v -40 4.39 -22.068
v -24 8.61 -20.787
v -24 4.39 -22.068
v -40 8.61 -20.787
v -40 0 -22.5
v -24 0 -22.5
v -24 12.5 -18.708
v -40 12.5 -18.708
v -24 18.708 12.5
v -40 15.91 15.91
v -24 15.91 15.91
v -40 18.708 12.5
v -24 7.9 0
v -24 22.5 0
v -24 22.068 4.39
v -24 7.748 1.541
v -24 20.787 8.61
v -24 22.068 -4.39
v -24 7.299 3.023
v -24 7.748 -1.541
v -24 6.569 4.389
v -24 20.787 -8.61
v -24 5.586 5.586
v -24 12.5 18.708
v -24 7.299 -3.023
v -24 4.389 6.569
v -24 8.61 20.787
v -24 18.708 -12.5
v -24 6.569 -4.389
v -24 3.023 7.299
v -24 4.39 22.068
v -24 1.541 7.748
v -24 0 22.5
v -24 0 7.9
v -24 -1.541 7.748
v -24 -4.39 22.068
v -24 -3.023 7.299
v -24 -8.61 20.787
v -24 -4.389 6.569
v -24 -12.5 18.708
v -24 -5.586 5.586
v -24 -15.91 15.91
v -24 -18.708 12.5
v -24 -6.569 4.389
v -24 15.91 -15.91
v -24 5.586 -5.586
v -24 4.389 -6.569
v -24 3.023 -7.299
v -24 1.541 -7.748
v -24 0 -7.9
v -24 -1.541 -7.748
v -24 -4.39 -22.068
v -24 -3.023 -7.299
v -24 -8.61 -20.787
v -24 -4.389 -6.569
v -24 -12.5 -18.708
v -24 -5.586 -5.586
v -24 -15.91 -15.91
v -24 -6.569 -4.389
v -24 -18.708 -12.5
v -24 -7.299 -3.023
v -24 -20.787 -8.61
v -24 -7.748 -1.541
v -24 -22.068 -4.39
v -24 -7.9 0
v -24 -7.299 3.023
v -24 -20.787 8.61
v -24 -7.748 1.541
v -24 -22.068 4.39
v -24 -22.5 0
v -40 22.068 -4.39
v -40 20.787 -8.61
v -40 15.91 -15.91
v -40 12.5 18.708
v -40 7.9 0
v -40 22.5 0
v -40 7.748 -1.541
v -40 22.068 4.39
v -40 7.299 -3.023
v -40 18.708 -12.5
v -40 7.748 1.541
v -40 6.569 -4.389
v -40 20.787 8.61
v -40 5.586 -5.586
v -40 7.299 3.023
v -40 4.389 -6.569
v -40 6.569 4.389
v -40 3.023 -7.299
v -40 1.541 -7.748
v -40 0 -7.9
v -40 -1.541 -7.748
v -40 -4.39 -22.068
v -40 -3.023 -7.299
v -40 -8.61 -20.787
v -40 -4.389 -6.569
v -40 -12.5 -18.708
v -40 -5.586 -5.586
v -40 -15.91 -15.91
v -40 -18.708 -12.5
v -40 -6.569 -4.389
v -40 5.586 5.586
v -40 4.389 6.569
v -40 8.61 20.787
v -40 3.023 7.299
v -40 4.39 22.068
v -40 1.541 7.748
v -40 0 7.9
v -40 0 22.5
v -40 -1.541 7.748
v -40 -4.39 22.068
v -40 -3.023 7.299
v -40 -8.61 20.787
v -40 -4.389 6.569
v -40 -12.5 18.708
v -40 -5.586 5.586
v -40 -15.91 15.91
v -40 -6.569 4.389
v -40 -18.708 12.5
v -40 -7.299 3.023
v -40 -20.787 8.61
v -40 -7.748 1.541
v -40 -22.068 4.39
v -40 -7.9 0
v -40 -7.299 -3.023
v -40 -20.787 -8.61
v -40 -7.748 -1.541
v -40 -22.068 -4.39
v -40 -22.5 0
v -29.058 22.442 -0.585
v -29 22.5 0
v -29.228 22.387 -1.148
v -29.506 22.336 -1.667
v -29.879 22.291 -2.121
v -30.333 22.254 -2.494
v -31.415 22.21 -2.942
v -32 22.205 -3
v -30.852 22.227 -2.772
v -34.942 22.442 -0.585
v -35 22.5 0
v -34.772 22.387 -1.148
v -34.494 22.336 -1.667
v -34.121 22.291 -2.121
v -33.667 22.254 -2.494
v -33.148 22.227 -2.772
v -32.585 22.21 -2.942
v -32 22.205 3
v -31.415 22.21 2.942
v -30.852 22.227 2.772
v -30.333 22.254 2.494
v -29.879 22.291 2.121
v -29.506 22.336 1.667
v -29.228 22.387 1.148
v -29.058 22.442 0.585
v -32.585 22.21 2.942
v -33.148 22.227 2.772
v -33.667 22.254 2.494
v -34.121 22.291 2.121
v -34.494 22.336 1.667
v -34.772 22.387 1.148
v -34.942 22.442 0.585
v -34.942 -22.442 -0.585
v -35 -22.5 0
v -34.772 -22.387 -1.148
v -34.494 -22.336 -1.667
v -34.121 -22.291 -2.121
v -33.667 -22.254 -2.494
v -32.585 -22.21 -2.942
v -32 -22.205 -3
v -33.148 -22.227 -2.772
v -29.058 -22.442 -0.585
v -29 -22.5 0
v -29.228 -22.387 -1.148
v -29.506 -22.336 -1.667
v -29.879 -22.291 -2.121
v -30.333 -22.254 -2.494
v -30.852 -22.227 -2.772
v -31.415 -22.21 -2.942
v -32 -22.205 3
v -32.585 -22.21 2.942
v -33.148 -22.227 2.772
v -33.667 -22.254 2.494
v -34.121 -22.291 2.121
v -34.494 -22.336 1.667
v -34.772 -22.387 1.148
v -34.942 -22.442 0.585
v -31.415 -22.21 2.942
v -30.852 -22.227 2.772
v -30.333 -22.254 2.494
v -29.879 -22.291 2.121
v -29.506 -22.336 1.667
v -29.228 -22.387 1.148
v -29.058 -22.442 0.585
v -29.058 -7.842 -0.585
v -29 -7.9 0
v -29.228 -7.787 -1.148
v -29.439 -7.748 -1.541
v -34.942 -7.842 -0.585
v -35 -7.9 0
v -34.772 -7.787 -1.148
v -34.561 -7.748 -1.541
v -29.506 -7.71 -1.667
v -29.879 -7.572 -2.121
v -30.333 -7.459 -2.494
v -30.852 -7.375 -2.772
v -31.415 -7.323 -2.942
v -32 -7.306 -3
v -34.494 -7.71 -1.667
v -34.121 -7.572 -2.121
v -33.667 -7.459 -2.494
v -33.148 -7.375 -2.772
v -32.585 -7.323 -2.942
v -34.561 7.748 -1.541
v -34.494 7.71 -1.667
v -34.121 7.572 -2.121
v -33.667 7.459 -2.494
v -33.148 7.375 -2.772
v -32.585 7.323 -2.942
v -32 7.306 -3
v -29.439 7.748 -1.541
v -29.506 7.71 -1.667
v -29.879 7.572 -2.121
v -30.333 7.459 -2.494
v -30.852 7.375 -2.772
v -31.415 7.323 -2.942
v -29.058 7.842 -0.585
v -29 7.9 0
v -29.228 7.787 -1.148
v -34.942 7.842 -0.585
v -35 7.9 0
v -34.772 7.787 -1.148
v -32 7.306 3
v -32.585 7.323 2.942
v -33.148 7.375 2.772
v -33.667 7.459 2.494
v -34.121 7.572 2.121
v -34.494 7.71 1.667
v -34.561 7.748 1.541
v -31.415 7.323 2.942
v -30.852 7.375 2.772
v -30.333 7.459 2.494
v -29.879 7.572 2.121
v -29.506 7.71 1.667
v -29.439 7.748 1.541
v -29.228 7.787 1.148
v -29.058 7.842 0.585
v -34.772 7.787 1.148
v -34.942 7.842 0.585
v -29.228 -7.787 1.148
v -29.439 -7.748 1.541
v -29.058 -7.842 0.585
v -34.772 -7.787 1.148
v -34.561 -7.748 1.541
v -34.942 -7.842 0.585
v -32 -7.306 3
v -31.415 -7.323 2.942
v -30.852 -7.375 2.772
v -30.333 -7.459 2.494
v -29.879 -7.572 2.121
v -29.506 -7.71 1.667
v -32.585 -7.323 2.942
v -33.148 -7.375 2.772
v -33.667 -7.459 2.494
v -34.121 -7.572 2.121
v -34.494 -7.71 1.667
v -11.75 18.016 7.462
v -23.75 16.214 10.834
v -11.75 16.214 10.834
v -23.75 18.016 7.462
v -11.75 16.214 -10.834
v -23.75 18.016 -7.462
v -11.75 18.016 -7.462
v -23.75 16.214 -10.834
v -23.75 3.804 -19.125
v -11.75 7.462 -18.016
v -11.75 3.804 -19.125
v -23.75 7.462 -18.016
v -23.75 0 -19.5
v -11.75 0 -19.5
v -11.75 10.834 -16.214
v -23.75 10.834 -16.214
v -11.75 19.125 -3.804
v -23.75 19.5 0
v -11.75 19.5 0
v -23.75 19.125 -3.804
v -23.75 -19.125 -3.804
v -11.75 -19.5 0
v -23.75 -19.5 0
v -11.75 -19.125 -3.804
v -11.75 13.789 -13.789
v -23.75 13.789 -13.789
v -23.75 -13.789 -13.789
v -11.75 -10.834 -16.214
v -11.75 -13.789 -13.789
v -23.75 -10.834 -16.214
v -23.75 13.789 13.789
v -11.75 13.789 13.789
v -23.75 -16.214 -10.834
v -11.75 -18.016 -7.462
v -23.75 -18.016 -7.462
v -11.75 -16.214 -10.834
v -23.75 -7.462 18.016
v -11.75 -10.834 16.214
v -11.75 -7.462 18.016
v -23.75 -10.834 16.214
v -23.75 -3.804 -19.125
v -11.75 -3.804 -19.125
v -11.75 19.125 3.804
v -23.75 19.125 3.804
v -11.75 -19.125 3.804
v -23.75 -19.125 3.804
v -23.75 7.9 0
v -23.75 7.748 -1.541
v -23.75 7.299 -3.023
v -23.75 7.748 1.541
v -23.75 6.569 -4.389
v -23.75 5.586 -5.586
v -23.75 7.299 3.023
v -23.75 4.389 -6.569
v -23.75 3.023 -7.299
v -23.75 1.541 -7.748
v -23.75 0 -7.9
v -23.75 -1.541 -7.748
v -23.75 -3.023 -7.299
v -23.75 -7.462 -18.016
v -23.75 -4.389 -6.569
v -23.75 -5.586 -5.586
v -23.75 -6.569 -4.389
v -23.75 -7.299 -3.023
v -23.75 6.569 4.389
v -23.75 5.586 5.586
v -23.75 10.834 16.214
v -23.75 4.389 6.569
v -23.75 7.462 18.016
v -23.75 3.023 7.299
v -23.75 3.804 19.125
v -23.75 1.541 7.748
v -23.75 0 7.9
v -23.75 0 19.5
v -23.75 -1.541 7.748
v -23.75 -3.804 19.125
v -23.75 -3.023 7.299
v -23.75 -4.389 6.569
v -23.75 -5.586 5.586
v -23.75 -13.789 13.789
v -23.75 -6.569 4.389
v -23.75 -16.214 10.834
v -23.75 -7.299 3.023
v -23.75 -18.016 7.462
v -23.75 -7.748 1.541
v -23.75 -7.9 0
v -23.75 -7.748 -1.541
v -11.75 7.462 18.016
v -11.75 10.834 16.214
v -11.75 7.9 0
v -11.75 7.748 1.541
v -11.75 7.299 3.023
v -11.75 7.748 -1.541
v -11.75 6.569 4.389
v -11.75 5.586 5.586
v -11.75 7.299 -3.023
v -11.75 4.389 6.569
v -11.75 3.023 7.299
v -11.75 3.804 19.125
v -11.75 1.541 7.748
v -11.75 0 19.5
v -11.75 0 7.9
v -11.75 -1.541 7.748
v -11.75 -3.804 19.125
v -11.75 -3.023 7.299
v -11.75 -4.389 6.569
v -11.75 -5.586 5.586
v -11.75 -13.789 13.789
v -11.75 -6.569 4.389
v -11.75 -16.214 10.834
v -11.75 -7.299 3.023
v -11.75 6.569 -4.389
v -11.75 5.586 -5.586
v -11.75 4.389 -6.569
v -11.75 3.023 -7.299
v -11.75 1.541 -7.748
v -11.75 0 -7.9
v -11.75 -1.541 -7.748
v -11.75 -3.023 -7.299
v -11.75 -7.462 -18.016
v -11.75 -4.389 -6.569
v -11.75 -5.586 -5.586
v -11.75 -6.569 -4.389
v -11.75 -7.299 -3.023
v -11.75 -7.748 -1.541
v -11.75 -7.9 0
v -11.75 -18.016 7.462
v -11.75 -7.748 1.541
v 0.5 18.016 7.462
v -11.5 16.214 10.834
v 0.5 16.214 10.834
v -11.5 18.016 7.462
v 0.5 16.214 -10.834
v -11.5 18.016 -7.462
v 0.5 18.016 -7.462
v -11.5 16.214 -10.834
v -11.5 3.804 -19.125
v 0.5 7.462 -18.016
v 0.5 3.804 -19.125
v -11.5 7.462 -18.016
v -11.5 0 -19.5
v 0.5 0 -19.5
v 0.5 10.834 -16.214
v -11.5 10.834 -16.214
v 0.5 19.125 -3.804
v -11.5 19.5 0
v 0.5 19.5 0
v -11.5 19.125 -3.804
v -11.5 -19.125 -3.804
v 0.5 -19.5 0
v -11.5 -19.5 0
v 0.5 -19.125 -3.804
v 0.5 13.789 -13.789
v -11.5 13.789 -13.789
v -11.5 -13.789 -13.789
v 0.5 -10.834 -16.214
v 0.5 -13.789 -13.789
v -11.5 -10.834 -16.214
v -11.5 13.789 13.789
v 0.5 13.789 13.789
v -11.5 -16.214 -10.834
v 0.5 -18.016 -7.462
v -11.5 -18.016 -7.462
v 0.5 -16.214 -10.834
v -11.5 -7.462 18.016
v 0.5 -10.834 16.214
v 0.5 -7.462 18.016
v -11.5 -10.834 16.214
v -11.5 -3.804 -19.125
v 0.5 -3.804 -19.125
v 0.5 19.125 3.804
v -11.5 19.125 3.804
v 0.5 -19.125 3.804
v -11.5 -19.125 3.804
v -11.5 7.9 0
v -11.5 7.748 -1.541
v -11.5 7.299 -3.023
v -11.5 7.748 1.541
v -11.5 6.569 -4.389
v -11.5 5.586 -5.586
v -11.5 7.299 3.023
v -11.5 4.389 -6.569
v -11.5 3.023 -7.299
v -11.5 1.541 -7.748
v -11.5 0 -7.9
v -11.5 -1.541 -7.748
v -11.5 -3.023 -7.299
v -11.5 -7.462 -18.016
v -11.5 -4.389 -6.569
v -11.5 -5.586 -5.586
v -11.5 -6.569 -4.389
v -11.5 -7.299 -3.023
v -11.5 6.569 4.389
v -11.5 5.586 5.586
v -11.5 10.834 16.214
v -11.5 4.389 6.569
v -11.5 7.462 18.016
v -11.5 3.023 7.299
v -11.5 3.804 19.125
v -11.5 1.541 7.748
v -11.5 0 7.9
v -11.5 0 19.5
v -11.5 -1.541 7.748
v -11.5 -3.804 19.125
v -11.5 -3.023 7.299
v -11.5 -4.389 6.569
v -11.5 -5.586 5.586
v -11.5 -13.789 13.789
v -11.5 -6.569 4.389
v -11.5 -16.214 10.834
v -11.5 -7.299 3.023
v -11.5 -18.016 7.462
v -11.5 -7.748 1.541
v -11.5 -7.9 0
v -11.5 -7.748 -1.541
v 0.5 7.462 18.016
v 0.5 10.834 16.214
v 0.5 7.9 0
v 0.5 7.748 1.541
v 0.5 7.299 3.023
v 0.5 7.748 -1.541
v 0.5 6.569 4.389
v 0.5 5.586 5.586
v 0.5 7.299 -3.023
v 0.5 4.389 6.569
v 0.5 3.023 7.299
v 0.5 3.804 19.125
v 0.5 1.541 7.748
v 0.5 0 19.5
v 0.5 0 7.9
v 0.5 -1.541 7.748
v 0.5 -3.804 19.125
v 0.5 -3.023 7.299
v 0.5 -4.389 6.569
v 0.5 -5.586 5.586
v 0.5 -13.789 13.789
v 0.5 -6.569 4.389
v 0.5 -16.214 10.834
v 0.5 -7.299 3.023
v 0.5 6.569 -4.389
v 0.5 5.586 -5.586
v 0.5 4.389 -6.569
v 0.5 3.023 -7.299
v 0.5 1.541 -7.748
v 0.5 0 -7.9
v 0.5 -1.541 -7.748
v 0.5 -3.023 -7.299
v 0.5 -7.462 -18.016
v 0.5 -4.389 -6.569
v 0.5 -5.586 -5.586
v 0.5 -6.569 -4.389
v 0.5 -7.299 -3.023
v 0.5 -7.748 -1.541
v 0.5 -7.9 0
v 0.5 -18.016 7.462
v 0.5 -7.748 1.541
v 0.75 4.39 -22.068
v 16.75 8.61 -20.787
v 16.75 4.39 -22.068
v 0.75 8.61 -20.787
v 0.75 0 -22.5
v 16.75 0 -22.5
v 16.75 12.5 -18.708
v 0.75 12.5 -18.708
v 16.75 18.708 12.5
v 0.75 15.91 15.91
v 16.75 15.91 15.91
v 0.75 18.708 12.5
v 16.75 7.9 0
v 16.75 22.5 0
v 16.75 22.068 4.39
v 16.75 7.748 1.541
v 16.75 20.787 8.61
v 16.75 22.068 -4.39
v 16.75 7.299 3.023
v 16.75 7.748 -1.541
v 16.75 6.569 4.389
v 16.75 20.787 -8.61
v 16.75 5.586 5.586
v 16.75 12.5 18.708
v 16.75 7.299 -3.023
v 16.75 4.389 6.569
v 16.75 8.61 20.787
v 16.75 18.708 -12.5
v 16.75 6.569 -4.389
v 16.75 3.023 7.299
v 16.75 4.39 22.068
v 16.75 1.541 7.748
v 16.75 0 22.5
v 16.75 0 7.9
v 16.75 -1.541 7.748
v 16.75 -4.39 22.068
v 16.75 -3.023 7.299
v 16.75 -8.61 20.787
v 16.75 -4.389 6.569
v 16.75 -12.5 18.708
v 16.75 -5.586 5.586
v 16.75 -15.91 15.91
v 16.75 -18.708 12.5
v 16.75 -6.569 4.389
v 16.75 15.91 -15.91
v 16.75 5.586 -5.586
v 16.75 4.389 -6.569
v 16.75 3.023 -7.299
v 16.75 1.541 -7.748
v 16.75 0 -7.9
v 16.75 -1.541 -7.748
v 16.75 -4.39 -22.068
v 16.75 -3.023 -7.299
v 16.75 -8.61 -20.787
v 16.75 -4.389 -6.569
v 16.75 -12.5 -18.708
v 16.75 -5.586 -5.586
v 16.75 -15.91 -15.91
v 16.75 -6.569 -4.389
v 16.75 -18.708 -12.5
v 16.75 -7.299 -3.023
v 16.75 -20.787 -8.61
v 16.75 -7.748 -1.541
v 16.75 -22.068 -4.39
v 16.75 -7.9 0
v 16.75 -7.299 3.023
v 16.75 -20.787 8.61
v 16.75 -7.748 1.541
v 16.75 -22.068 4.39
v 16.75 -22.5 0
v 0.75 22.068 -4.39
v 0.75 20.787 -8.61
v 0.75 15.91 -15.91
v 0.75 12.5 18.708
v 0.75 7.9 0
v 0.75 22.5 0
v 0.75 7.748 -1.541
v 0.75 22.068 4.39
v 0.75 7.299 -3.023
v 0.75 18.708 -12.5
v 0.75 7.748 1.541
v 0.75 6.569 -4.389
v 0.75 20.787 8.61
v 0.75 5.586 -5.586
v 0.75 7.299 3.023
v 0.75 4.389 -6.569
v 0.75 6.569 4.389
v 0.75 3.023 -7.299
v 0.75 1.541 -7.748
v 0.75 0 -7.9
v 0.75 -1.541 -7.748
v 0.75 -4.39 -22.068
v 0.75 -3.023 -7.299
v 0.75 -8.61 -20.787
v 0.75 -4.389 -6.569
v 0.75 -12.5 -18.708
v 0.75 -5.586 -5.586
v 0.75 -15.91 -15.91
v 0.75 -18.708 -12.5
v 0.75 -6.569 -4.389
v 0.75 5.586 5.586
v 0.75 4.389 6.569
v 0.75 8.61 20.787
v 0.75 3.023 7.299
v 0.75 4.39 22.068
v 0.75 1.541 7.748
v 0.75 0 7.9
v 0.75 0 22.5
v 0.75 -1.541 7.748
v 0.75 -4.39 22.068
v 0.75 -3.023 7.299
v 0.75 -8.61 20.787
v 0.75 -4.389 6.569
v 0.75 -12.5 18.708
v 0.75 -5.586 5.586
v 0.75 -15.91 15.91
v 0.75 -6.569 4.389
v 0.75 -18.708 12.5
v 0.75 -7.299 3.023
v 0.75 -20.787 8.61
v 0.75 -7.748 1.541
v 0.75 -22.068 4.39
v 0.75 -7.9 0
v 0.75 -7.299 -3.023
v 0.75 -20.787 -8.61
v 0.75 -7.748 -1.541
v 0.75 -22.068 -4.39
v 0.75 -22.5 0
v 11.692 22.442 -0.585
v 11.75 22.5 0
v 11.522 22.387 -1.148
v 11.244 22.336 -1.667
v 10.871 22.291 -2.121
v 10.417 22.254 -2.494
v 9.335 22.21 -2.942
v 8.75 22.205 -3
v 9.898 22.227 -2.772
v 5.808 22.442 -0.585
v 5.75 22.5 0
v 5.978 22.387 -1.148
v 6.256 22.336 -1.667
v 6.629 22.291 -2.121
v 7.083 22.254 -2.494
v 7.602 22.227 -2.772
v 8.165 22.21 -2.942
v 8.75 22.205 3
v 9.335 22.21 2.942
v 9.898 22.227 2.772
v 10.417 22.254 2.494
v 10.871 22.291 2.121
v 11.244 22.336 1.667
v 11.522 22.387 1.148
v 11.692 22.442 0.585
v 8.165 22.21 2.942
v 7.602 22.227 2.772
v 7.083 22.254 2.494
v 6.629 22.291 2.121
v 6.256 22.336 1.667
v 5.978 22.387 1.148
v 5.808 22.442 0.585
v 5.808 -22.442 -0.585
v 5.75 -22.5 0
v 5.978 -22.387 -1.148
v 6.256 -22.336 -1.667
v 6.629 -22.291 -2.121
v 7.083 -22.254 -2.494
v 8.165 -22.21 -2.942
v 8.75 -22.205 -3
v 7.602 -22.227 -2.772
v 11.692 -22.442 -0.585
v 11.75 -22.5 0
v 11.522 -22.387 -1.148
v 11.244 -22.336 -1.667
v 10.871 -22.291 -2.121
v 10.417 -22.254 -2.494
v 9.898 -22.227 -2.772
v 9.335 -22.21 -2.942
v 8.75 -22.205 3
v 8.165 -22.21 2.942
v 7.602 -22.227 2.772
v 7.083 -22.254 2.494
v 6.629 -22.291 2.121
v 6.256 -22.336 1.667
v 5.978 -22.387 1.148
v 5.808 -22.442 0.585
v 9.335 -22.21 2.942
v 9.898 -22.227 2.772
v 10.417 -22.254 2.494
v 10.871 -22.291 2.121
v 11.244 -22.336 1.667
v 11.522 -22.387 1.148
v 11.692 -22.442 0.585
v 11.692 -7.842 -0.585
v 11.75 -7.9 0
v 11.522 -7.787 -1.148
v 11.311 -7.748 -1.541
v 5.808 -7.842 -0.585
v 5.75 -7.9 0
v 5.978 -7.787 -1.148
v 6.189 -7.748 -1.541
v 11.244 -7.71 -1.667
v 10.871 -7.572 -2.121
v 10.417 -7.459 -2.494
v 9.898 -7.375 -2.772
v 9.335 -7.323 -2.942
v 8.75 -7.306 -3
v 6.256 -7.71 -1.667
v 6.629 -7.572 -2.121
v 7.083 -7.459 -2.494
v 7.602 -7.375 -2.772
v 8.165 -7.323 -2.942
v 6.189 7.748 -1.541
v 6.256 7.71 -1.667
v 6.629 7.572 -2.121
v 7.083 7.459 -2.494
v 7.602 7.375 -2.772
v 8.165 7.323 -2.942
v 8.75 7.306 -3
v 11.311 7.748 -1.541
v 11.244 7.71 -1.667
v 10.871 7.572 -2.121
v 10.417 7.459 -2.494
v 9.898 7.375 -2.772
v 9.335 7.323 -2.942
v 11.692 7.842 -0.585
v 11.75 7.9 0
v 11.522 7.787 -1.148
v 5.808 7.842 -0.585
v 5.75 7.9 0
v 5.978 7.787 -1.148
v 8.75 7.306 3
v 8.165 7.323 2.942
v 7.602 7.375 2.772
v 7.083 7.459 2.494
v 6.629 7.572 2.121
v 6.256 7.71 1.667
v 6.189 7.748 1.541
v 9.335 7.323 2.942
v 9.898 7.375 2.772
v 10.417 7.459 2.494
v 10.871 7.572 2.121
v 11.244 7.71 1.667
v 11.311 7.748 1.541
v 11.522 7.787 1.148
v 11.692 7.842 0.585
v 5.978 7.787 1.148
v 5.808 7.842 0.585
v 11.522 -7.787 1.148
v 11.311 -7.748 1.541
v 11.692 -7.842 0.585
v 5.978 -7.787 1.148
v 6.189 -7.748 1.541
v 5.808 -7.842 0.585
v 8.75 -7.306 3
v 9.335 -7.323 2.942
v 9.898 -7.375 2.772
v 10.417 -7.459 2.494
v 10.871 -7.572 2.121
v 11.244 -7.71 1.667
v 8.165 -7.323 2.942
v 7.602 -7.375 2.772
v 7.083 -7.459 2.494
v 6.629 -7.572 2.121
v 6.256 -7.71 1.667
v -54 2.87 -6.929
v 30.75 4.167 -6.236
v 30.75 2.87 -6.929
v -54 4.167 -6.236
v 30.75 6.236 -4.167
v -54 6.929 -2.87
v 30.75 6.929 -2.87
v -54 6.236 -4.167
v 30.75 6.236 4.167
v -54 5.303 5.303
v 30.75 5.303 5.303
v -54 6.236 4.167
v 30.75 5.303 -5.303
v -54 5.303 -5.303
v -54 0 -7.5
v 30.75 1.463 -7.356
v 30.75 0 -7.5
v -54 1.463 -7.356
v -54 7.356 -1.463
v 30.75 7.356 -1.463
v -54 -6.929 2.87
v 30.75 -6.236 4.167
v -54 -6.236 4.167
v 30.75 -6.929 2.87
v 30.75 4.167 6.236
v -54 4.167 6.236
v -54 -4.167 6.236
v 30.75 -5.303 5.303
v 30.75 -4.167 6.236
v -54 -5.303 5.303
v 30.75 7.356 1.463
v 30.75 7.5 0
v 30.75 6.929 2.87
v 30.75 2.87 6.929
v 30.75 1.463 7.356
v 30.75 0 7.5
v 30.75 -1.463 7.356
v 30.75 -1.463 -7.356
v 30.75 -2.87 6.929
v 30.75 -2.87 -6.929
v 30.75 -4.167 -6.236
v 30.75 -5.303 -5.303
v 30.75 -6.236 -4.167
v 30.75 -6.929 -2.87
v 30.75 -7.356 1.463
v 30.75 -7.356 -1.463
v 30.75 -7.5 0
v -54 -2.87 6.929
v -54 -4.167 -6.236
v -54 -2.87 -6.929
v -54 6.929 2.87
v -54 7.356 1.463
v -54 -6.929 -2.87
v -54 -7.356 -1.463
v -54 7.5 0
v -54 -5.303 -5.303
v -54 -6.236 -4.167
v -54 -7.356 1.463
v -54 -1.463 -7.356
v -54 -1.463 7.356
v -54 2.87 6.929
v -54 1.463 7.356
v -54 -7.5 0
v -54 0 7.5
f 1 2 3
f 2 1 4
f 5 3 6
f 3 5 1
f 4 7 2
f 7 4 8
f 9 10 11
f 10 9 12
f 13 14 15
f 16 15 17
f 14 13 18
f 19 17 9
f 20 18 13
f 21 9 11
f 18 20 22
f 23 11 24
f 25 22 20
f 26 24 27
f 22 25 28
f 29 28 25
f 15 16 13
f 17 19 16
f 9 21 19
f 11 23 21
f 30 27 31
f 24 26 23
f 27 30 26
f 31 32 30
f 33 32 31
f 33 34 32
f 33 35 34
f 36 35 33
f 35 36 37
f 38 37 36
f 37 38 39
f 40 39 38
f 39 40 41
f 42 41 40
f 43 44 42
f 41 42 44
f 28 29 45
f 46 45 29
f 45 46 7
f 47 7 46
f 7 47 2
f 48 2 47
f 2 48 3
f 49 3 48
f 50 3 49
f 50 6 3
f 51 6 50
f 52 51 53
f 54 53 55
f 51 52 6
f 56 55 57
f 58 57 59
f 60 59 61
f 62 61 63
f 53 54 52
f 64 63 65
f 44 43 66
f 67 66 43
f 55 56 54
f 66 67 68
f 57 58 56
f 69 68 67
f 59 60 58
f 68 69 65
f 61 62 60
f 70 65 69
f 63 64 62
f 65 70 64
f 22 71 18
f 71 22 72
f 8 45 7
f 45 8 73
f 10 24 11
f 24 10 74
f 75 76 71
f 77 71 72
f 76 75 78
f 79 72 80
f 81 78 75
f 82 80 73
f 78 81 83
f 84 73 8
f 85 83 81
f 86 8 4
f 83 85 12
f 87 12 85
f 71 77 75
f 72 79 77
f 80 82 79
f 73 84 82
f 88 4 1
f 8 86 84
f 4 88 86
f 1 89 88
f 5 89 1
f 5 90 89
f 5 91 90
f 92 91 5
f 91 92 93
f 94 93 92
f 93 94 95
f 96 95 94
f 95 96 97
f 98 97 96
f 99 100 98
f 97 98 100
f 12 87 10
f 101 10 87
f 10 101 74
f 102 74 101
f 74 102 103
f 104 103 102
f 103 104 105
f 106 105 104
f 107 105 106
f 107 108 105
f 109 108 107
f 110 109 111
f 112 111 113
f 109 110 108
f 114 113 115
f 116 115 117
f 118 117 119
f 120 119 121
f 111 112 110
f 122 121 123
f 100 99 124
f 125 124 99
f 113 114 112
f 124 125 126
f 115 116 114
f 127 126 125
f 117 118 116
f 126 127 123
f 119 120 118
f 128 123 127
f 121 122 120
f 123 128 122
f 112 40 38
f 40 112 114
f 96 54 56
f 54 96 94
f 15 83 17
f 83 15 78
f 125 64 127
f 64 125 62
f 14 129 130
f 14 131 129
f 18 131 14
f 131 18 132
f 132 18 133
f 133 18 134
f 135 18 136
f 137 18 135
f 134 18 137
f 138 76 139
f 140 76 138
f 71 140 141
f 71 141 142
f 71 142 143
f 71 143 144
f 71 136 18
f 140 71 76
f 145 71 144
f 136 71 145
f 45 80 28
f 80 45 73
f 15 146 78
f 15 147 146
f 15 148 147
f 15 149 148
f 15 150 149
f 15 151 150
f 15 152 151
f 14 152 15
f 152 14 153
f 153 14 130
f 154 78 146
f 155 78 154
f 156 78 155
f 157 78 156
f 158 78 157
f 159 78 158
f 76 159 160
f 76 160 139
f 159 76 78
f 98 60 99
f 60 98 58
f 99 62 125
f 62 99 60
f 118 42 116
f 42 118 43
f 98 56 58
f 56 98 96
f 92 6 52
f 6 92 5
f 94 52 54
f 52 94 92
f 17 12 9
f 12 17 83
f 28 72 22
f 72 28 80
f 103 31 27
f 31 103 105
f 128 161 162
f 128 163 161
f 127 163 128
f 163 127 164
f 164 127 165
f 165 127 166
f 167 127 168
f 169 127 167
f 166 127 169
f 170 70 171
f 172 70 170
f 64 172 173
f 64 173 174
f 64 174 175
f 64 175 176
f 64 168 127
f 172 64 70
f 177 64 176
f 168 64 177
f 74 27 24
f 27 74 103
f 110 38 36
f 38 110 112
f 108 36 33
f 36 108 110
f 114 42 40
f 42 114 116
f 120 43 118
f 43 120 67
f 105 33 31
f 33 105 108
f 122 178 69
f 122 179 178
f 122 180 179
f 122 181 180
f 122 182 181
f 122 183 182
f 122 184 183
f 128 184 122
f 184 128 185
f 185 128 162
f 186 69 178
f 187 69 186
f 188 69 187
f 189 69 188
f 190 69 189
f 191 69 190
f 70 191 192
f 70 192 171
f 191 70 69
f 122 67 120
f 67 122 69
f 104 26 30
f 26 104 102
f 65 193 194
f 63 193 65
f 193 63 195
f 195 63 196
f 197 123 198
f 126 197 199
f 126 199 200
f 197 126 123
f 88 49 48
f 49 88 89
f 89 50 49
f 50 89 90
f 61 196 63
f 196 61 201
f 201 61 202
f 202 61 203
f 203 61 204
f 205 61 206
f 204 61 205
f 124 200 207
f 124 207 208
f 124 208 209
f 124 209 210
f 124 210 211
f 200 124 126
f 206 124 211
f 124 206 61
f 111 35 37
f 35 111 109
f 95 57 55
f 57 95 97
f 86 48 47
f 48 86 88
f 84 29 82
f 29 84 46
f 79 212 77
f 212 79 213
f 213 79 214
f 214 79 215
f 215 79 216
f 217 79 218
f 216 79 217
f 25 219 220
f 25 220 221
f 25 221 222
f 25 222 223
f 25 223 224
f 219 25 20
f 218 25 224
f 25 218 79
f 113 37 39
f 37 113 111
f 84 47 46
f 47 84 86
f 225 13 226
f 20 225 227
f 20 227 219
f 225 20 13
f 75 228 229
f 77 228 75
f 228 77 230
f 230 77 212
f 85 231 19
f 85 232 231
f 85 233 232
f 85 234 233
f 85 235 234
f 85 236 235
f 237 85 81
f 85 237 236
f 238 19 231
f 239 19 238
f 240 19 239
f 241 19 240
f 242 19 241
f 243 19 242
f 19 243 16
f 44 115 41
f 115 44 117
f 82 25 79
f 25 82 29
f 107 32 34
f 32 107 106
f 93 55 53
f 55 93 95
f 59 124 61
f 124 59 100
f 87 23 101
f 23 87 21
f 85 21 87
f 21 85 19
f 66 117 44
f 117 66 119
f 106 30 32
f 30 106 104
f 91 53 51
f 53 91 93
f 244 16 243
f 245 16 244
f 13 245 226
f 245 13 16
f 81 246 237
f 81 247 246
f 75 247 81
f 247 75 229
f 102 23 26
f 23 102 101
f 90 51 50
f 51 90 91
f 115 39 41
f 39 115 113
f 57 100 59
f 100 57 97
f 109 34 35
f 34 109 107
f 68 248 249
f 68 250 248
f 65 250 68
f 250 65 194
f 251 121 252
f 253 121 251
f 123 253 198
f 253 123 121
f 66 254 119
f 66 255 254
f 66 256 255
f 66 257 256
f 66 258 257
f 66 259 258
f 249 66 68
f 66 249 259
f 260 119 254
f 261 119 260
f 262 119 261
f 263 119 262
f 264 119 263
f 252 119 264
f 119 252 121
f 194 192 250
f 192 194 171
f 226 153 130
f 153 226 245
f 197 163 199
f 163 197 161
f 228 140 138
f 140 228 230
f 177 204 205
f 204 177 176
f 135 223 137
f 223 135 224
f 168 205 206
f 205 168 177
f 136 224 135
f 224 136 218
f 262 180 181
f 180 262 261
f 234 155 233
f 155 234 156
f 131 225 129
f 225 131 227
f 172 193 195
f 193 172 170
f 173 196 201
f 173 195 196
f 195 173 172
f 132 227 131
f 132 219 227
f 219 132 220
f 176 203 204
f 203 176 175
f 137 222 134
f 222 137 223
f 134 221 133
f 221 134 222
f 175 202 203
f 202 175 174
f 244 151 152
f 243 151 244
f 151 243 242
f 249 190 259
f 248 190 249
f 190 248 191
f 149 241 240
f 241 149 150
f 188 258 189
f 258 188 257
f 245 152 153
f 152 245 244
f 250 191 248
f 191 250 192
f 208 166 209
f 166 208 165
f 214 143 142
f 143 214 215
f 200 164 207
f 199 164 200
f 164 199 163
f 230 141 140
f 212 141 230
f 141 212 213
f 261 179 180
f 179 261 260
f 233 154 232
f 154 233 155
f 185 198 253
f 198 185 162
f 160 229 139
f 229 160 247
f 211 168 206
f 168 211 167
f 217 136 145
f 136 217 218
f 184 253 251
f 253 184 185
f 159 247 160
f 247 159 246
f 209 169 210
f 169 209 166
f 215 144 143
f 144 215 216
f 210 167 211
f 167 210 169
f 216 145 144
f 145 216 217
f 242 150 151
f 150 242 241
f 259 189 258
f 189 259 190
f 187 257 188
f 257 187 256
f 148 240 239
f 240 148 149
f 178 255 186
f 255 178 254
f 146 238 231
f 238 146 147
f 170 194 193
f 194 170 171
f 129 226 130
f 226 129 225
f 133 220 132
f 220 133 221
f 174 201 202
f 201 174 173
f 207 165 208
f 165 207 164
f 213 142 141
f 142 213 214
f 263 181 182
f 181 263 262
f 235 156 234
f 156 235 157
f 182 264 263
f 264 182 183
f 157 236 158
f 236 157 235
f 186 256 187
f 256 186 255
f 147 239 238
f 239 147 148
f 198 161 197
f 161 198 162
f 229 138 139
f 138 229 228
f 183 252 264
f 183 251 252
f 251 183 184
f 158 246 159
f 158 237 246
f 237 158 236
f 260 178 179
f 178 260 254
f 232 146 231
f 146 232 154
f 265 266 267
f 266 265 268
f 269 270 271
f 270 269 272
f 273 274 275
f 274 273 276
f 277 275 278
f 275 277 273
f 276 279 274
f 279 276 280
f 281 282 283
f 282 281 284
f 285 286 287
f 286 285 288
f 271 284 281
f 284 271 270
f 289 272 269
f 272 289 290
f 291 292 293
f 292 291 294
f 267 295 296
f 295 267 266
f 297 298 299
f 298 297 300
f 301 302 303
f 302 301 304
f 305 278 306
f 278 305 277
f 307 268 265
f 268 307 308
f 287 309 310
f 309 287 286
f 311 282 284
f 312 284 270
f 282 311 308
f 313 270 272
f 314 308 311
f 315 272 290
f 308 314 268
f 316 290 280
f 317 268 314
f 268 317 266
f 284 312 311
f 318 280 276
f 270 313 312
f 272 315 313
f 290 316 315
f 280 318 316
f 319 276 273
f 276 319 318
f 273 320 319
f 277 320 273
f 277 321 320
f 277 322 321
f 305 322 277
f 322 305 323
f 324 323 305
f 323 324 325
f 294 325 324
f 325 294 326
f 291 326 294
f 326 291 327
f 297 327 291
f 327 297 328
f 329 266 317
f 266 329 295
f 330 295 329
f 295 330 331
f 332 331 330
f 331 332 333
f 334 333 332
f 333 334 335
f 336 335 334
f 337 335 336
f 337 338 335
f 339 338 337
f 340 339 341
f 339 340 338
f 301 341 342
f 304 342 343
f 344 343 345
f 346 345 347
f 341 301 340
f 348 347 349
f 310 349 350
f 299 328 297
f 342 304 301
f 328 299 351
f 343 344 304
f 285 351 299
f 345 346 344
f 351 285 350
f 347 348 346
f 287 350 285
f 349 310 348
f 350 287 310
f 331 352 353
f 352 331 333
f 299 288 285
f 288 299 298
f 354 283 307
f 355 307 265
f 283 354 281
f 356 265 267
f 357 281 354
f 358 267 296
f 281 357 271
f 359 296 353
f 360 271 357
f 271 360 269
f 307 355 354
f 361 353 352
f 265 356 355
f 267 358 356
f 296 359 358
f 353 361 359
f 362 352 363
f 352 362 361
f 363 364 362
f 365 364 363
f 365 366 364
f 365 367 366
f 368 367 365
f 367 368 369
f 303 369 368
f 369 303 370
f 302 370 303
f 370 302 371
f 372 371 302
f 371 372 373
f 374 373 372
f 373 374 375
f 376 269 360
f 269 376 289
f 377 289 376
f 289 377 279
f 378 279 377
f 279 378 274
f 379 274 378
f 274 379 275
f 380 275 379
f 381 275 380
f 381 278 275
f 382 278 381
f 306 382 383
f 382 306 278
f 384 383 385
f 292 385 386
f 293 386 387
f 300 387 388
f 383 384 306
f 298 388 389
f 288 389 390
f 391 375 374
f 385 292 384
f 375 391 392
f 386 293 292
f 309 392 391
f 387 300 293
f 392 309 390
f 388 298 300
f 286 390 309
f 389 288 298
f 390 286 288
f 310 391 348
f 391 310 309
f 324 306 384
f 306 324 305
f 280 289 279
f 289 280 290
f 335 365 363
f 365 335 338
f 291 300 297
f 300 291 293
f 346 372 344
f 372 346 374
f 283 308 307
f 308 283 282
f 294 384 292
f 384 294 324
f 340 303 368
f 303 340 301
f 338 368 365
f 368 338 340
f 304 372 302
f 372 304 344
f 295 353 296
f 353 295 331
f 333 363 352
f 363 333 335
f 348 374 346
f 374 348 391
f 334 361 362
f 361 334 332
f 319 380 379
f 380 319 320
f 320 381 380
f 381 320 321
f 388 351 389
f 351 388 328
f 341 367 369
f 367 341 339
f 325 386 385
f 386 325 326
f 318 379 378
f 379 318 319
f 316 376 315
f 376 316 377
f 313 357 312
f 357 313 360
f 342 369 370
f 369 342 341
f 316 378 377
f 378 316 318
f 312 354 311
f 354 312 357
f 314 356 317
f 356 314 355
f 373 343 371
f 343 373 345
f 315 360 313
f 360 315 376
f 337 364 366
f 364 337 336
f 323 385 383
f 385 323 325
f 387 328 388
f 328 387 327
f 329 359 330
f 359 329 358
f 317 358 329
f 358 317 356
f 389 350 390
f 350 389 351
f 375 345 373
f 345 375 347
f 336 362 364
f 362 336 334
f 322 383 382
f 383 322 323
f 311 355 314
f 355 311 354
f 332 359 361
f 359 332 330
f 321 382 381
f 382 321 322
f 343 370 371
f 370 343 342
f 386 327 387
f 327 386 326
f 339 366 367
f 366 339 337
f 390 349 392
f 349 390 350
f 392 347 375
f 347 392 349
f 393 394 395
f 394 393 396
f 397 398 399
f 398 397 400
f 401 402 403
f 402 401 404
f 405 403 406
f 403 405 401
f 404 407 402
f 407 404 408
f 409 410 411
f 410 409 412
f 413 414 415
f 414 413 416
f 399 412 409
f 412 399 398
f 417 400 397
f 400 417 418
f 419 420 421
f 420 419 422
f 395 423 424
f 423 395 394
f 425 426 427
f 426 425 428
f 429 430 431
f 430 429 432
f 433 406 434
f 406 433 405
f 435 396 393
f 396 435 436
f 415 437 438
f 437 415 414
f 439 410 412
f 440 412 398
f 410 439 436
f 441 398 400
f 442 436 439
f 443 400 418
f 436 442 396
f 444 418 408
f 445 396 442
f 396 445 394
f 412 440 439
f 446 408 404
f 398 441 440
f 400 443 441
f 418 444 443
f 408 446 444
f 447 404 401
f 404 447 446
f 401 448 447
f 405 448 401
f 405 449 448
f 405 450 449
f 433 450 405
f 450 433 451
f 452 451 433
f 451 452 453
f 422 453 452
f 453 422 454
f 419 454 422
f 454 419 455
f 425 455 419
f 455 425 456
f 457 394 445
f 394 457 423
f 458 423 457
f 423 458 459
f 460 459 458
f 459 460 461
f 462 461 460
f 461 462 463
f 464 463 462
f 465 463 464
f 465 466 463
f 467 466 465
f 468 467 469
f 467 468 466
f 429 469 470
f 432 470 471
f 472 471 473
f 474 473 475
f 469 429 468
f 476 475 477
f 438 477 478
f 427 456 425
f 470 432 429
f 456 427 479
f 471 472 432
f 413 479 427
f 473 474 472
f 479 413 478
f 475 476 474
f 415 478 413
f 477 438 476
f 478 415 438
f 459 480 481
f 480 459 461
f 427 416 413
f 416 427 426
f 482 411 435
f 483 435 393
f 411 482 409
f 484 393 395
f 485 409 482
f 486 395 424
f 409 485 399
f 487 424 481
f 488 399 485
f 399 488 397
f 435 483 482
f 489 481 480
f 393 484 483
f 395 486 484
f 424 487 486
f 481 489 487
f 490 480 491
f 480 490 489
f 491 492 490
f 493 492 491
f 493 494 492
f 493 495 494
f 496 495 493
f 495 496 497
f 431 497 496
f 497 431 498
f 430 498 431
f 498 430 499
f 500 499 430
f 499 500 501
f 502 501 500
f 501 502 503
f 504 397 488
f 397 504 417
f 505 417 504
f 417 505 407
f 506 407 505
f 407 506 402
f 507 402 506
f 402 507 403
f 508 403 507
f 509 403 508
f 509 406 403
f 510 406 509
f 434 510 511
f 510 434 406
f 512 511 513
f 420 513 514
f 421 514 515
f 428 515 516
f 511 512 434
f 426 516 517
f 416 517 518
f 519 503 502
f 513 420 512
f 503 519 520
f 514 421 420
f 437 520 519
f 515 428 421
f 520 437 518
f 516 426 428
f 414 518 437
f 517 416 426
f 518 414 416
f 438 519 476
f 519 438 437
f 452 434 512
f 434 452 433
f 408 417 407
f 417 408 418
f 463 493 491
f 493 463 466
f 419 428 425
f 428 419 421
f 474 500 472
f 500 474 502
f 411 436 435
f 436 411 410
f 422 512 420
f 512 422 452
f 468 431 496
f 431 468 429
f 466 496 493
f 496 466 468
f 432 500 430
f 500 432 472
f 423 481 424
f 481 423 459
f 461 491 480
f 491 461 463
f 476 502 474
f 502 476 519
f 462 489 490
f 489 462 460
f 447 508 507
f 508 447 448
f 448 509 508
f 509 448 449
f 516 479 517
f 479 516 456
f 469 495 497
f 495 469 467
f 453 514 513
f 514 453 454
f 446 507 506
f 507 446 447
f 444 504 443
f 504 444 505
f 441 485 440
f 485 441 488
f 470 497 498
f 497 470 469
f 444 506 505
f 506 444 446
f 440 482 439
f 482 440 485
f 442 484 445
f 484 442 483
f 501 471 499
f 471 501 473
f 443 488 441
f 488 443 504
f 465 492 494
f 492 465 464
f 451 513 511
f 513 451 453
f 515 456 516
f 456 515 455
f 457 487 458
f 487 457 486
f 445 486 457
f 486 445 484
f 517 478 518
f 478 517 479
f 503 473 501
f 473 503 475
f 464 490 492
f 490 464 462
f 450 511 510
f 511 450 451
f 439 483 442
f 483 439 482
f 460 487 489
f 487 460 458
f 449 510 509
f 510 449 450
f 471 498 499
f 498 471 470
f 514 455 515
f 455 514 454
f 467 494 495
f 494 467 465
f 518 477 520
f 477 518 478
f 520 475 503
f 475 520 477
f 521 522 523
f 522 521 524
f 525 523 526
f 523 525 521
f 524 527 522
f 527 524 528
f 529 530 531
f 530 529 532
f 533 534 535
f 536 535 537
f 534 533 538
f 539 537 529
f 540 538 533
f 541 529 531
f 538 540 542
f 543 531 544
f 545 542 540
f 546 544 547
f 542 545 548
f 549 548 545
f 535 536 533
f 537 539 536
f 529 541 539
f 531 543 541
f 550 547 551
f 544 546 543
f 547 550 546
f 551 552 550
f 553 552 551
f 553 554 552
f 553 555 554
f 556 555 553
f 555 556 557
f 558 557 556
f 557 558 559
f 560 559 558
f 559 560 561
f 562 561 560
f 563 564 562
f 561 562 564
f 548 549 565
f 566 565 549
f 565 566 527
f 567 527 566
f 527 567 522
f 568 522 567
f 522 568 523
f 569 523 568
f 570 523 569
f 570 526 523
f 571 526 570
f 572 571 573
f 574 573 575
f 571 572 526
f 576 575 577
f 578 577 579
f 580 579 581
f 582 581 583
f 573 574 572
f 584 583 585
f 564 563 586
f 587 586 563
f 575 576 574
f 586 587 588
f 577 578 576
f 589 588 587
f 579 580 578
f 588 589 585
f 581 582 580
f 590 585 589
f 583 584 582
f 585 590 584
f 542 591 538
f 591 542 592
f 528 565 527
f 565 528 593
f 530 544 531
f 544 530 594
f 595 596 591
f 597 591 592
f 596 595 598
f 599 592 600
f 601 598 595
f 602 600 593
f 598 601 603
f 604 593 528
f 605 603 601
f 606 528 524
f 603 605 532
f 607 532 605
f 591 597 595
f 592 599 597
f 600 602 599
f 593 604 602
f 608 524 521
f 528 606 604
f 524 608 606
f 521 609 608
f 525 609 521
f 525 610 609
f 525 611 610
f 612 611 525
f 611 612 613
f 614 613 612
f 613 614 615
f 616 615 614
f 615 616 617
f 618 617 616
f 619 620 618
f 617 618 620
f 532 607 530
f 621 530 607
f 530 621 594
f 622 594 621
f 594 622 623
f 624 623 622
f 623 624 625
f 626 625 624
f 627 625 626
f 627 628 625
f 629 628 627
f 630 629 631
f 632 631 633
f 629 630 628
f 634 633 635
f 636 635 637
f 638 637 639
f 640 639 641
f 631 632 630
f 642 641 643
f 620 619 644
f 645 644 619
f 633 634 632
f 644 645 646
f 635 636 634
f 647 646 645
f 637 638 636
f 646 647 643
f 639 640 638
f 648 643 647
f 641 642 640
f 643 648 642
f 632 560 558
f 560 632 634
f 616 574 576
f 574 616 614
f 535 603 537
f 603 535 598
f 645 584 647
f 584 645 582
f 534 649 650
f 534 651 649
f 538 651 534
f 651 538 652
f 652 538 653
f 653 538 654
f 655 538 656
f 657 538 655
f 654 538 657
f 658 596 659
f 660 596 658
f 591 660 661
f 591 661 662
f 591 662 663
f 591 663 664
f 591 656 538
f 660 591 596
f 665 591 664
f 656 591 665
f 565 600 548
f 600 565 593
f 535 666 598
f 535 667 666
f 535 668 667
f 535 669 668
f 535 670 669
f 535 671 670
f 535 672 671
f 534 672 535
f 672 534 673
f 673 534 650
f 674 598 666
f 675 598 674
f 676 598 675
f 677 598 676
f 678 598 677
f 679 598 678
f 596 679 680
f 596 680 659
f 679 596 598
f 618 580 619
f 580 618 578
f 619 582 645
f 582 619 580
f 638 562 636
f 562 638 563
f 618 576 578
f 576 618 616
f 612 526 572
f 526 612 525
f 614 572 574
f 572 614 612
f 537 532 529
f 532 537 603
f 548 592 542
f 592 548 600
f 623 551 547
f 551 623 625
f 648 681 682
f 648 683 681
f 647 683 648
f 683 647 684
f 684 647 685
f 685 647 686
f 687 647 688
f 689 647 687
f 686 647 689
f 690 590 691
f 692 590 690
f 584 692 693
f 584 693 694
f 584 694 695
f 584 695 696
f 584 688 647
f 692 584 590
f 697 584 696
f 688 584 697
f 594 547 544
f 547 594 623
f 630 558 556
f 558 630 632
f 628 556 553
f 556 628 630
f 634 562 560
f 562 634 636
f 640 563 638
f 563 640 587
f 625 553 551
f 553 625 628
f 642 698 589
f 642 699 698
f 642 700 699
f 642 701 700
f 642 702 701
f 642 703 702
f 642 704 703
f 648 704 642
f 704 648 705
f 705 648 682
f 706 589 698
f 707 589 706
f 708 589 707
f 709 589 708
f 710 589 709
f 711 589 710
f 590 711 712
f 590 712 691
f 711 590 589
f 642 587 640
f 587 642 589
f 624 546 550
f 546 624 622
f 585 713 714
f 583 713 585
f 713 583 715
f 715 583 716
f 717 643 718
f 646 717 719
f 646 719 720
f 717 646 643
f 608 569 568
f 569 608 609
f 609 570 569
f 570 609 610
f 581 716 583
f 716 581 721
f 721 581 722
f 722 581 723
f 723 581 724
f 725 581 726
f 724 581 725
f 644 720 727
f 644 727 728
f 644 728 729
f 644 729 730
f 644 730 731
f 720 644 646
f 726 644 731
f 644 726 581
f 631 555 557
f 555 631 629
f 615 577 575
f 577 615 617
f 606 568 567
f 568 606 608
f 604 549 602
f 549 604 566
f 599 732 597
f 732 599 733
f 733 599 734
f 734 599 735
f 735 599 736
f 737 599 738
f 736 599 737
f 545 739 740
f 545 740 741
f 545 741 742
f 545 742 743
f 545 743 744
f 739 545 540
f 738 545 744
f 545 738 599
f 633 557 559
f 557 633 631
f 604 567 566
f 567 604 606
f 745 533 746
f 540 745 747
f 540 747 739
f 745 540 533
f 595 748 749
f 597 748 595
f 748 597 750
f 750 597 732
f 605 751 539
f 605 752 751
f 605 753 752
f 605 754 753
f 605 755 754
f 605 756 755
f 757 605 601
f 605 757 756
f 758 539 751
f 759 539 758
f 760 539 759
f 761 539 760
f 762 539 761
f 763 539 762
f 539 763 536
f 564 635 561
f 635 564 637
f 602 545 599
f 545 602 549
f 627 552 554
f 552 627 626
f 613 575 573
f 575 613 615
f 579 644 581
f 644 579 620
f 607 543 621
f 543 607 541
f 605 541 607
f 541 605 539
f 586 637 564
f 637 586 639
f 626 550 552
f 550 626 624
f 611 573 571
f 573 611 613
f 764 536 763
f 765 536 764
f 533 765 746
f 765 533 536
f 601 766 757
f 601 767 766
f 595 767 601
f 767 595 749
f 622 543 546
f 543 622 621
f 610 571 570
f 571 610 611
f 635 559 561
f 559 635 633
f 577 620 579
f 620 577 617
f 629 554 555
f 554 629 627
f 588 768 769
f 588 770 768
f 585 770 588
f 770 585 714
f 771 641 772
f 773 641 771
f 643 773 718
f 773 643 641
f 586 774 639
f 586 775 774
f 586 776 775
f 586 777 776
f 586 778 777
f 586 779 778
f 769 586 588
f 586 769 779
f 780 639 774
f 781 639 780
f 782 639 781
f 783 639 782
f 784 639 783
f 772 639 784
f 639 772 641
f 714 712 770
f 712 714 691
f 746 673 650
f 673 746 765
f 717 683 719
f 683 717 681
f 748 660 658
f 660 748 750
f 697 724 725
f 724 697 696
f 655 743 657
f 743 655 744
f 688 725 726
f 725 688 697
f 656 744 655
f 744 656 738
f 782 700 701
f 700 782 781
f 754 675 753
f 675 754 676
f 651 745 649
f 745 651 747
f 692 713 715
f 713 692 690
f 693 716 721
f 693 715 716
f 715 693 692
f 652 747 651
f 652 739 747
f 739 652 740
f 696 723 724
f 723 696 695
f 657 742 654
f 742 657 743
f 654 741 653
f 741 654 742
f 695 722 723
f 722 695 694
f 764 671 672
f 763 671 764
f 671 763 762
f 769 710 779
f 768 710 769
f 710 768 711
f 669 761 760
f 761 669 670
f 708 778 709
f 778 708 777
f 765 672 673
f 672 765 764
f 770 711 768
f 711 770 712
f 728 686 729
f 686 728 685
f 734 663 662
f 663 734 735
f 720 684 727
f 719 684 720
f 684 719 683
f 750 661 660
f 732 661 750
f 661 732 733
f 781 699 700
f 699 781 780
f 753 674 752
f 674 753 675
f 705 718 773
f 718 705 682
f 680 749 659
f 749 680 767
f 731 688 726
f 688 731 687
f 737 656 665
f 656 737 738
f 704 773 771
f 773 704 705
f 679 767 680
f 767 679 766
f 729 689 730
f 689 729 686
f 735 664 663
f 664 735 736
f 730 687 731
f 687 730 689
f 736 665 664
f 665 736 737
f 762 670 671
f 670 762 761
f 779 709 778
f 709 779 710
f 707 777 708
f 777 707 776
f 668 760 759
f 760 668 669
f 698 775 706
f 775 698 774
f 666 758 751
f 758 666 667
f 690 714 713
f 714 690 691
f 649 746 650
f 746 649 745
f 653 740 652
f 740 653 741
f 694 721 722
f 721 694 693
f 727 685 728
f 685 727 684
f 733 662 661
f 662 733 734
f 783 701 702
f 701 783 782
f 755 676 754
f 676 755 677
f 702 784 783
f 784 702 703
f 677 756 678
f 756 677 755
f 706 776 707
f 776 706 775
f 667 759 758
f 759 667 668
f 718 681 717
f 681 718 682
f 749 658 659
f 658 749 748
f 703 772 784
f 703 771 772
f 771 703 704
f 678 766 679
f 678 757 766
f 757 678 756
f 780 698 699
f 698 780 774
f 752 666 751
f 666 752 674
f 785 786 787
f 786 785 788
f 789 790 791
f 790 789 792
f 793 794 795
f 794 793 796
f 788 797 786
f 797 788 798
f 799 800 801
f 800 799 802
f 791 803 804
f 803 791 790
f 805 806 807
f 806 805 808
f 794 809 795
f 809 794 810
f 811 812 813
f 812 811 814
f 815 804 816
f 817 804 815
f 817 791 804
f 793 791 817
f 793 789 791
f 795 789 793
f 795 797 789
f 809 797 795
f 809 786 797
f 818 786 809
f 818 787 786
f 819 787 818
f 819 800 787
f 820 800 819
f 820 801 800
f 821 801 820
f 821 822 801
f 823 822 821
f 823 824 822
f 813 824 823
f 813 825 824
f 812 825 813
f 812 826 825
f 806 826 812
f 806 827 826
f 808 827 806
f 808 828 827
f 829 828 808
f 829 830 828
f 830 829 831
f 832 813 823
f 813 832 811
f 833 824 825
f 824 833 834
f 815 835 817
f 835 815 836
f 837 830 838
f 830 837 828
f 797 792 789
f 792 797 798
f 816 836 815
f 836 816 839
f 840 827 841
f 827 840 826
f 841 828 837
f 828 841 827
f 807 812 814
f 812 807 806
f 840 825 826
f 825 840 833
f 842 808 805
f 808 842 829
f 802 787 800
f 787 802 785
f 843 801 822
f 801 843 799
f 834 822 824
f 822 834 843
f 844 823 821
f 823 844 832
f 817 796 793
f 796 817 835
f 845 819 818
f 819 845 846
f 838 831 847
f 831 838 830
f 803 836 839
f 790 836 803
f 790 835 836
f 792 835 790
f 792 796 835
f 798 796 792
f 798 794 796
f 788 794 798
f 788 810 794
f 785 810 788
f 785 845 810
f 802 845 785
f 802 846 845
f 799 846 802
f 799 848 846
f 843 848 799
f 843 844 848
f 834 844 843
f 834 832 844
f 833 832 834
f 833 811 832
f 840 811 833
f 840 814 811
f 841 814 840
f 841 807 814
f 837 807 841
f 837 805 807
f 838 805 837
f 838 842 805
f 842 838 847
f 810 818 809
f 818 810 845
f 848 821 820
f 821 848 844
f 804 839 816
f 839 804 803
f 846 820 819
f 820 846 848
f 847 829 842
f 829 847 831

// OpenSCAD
$fn = 32;

// ------------------------------------------------------------------------
// Shaft with rings and collars: d15 shaft, 4 rings
// Every part is its own module, assembly() places them once.
// ------------------------------------------------------------------------

// --- part 1 ---
module shaft() {
  translate([0, 0, -42.375]) cylinder(h = 84.75, d = 15);
}

// --- part 2 ---
module collar_a() {
  difference() {
    cylinder(h = 16, d = 45);
    translate([0, 0, -1]) cylinder(h = 18, d = 15.8);
    translate([0, 0, 8]) rotate([90, 0, 0]) cylinder(h = 47, d = 6, center = true);
  }
}

// --- part 3 ---
module spacer_a() {
  difference() {
      translate([0, 0, 0]) cylinder(h = 12, d = 39);
      translate([0, 0, -1]) cylinder(h = 14, d = 15.8);
    }
}

// --- part 4 ---
module spacer_b() {
  difference() {
      translate([0, 0, 0]) cylinder(h = 12, d = 39);
      translate([0, 0, -1]) cylinder(h = 14, d = 15.8);
    }
}

// --- part 5 ---
module collar_b() {
  difference() {
    cylinder(h = 16, d = 45);
    translate([0, 0, -1]) cylinder(h = 18, d = 15.8);
    translate([0, 0, 8]) rotate([90, 0, 0]) cylinder(h = 47, d = 6, center = true);
  }
}

// --- assembly ---
module assembly() {
  translate([-11.625, 0, 0]) rotate([0, 90, 0]) shaft();
  translate([-40, 0, 0]) rotate([0, 90, 0]) collar_a();
  translate([-23.75, 0, 0]) rotate([0, 90, 0]) spacer_a();
  translate([-11.5, 0, 0]) rotate([0, 90, 0]) spacer_b();
  translate([0.75, 0, 0]) rotate([0, 90, 0]) collar_b();
}

assembly();
